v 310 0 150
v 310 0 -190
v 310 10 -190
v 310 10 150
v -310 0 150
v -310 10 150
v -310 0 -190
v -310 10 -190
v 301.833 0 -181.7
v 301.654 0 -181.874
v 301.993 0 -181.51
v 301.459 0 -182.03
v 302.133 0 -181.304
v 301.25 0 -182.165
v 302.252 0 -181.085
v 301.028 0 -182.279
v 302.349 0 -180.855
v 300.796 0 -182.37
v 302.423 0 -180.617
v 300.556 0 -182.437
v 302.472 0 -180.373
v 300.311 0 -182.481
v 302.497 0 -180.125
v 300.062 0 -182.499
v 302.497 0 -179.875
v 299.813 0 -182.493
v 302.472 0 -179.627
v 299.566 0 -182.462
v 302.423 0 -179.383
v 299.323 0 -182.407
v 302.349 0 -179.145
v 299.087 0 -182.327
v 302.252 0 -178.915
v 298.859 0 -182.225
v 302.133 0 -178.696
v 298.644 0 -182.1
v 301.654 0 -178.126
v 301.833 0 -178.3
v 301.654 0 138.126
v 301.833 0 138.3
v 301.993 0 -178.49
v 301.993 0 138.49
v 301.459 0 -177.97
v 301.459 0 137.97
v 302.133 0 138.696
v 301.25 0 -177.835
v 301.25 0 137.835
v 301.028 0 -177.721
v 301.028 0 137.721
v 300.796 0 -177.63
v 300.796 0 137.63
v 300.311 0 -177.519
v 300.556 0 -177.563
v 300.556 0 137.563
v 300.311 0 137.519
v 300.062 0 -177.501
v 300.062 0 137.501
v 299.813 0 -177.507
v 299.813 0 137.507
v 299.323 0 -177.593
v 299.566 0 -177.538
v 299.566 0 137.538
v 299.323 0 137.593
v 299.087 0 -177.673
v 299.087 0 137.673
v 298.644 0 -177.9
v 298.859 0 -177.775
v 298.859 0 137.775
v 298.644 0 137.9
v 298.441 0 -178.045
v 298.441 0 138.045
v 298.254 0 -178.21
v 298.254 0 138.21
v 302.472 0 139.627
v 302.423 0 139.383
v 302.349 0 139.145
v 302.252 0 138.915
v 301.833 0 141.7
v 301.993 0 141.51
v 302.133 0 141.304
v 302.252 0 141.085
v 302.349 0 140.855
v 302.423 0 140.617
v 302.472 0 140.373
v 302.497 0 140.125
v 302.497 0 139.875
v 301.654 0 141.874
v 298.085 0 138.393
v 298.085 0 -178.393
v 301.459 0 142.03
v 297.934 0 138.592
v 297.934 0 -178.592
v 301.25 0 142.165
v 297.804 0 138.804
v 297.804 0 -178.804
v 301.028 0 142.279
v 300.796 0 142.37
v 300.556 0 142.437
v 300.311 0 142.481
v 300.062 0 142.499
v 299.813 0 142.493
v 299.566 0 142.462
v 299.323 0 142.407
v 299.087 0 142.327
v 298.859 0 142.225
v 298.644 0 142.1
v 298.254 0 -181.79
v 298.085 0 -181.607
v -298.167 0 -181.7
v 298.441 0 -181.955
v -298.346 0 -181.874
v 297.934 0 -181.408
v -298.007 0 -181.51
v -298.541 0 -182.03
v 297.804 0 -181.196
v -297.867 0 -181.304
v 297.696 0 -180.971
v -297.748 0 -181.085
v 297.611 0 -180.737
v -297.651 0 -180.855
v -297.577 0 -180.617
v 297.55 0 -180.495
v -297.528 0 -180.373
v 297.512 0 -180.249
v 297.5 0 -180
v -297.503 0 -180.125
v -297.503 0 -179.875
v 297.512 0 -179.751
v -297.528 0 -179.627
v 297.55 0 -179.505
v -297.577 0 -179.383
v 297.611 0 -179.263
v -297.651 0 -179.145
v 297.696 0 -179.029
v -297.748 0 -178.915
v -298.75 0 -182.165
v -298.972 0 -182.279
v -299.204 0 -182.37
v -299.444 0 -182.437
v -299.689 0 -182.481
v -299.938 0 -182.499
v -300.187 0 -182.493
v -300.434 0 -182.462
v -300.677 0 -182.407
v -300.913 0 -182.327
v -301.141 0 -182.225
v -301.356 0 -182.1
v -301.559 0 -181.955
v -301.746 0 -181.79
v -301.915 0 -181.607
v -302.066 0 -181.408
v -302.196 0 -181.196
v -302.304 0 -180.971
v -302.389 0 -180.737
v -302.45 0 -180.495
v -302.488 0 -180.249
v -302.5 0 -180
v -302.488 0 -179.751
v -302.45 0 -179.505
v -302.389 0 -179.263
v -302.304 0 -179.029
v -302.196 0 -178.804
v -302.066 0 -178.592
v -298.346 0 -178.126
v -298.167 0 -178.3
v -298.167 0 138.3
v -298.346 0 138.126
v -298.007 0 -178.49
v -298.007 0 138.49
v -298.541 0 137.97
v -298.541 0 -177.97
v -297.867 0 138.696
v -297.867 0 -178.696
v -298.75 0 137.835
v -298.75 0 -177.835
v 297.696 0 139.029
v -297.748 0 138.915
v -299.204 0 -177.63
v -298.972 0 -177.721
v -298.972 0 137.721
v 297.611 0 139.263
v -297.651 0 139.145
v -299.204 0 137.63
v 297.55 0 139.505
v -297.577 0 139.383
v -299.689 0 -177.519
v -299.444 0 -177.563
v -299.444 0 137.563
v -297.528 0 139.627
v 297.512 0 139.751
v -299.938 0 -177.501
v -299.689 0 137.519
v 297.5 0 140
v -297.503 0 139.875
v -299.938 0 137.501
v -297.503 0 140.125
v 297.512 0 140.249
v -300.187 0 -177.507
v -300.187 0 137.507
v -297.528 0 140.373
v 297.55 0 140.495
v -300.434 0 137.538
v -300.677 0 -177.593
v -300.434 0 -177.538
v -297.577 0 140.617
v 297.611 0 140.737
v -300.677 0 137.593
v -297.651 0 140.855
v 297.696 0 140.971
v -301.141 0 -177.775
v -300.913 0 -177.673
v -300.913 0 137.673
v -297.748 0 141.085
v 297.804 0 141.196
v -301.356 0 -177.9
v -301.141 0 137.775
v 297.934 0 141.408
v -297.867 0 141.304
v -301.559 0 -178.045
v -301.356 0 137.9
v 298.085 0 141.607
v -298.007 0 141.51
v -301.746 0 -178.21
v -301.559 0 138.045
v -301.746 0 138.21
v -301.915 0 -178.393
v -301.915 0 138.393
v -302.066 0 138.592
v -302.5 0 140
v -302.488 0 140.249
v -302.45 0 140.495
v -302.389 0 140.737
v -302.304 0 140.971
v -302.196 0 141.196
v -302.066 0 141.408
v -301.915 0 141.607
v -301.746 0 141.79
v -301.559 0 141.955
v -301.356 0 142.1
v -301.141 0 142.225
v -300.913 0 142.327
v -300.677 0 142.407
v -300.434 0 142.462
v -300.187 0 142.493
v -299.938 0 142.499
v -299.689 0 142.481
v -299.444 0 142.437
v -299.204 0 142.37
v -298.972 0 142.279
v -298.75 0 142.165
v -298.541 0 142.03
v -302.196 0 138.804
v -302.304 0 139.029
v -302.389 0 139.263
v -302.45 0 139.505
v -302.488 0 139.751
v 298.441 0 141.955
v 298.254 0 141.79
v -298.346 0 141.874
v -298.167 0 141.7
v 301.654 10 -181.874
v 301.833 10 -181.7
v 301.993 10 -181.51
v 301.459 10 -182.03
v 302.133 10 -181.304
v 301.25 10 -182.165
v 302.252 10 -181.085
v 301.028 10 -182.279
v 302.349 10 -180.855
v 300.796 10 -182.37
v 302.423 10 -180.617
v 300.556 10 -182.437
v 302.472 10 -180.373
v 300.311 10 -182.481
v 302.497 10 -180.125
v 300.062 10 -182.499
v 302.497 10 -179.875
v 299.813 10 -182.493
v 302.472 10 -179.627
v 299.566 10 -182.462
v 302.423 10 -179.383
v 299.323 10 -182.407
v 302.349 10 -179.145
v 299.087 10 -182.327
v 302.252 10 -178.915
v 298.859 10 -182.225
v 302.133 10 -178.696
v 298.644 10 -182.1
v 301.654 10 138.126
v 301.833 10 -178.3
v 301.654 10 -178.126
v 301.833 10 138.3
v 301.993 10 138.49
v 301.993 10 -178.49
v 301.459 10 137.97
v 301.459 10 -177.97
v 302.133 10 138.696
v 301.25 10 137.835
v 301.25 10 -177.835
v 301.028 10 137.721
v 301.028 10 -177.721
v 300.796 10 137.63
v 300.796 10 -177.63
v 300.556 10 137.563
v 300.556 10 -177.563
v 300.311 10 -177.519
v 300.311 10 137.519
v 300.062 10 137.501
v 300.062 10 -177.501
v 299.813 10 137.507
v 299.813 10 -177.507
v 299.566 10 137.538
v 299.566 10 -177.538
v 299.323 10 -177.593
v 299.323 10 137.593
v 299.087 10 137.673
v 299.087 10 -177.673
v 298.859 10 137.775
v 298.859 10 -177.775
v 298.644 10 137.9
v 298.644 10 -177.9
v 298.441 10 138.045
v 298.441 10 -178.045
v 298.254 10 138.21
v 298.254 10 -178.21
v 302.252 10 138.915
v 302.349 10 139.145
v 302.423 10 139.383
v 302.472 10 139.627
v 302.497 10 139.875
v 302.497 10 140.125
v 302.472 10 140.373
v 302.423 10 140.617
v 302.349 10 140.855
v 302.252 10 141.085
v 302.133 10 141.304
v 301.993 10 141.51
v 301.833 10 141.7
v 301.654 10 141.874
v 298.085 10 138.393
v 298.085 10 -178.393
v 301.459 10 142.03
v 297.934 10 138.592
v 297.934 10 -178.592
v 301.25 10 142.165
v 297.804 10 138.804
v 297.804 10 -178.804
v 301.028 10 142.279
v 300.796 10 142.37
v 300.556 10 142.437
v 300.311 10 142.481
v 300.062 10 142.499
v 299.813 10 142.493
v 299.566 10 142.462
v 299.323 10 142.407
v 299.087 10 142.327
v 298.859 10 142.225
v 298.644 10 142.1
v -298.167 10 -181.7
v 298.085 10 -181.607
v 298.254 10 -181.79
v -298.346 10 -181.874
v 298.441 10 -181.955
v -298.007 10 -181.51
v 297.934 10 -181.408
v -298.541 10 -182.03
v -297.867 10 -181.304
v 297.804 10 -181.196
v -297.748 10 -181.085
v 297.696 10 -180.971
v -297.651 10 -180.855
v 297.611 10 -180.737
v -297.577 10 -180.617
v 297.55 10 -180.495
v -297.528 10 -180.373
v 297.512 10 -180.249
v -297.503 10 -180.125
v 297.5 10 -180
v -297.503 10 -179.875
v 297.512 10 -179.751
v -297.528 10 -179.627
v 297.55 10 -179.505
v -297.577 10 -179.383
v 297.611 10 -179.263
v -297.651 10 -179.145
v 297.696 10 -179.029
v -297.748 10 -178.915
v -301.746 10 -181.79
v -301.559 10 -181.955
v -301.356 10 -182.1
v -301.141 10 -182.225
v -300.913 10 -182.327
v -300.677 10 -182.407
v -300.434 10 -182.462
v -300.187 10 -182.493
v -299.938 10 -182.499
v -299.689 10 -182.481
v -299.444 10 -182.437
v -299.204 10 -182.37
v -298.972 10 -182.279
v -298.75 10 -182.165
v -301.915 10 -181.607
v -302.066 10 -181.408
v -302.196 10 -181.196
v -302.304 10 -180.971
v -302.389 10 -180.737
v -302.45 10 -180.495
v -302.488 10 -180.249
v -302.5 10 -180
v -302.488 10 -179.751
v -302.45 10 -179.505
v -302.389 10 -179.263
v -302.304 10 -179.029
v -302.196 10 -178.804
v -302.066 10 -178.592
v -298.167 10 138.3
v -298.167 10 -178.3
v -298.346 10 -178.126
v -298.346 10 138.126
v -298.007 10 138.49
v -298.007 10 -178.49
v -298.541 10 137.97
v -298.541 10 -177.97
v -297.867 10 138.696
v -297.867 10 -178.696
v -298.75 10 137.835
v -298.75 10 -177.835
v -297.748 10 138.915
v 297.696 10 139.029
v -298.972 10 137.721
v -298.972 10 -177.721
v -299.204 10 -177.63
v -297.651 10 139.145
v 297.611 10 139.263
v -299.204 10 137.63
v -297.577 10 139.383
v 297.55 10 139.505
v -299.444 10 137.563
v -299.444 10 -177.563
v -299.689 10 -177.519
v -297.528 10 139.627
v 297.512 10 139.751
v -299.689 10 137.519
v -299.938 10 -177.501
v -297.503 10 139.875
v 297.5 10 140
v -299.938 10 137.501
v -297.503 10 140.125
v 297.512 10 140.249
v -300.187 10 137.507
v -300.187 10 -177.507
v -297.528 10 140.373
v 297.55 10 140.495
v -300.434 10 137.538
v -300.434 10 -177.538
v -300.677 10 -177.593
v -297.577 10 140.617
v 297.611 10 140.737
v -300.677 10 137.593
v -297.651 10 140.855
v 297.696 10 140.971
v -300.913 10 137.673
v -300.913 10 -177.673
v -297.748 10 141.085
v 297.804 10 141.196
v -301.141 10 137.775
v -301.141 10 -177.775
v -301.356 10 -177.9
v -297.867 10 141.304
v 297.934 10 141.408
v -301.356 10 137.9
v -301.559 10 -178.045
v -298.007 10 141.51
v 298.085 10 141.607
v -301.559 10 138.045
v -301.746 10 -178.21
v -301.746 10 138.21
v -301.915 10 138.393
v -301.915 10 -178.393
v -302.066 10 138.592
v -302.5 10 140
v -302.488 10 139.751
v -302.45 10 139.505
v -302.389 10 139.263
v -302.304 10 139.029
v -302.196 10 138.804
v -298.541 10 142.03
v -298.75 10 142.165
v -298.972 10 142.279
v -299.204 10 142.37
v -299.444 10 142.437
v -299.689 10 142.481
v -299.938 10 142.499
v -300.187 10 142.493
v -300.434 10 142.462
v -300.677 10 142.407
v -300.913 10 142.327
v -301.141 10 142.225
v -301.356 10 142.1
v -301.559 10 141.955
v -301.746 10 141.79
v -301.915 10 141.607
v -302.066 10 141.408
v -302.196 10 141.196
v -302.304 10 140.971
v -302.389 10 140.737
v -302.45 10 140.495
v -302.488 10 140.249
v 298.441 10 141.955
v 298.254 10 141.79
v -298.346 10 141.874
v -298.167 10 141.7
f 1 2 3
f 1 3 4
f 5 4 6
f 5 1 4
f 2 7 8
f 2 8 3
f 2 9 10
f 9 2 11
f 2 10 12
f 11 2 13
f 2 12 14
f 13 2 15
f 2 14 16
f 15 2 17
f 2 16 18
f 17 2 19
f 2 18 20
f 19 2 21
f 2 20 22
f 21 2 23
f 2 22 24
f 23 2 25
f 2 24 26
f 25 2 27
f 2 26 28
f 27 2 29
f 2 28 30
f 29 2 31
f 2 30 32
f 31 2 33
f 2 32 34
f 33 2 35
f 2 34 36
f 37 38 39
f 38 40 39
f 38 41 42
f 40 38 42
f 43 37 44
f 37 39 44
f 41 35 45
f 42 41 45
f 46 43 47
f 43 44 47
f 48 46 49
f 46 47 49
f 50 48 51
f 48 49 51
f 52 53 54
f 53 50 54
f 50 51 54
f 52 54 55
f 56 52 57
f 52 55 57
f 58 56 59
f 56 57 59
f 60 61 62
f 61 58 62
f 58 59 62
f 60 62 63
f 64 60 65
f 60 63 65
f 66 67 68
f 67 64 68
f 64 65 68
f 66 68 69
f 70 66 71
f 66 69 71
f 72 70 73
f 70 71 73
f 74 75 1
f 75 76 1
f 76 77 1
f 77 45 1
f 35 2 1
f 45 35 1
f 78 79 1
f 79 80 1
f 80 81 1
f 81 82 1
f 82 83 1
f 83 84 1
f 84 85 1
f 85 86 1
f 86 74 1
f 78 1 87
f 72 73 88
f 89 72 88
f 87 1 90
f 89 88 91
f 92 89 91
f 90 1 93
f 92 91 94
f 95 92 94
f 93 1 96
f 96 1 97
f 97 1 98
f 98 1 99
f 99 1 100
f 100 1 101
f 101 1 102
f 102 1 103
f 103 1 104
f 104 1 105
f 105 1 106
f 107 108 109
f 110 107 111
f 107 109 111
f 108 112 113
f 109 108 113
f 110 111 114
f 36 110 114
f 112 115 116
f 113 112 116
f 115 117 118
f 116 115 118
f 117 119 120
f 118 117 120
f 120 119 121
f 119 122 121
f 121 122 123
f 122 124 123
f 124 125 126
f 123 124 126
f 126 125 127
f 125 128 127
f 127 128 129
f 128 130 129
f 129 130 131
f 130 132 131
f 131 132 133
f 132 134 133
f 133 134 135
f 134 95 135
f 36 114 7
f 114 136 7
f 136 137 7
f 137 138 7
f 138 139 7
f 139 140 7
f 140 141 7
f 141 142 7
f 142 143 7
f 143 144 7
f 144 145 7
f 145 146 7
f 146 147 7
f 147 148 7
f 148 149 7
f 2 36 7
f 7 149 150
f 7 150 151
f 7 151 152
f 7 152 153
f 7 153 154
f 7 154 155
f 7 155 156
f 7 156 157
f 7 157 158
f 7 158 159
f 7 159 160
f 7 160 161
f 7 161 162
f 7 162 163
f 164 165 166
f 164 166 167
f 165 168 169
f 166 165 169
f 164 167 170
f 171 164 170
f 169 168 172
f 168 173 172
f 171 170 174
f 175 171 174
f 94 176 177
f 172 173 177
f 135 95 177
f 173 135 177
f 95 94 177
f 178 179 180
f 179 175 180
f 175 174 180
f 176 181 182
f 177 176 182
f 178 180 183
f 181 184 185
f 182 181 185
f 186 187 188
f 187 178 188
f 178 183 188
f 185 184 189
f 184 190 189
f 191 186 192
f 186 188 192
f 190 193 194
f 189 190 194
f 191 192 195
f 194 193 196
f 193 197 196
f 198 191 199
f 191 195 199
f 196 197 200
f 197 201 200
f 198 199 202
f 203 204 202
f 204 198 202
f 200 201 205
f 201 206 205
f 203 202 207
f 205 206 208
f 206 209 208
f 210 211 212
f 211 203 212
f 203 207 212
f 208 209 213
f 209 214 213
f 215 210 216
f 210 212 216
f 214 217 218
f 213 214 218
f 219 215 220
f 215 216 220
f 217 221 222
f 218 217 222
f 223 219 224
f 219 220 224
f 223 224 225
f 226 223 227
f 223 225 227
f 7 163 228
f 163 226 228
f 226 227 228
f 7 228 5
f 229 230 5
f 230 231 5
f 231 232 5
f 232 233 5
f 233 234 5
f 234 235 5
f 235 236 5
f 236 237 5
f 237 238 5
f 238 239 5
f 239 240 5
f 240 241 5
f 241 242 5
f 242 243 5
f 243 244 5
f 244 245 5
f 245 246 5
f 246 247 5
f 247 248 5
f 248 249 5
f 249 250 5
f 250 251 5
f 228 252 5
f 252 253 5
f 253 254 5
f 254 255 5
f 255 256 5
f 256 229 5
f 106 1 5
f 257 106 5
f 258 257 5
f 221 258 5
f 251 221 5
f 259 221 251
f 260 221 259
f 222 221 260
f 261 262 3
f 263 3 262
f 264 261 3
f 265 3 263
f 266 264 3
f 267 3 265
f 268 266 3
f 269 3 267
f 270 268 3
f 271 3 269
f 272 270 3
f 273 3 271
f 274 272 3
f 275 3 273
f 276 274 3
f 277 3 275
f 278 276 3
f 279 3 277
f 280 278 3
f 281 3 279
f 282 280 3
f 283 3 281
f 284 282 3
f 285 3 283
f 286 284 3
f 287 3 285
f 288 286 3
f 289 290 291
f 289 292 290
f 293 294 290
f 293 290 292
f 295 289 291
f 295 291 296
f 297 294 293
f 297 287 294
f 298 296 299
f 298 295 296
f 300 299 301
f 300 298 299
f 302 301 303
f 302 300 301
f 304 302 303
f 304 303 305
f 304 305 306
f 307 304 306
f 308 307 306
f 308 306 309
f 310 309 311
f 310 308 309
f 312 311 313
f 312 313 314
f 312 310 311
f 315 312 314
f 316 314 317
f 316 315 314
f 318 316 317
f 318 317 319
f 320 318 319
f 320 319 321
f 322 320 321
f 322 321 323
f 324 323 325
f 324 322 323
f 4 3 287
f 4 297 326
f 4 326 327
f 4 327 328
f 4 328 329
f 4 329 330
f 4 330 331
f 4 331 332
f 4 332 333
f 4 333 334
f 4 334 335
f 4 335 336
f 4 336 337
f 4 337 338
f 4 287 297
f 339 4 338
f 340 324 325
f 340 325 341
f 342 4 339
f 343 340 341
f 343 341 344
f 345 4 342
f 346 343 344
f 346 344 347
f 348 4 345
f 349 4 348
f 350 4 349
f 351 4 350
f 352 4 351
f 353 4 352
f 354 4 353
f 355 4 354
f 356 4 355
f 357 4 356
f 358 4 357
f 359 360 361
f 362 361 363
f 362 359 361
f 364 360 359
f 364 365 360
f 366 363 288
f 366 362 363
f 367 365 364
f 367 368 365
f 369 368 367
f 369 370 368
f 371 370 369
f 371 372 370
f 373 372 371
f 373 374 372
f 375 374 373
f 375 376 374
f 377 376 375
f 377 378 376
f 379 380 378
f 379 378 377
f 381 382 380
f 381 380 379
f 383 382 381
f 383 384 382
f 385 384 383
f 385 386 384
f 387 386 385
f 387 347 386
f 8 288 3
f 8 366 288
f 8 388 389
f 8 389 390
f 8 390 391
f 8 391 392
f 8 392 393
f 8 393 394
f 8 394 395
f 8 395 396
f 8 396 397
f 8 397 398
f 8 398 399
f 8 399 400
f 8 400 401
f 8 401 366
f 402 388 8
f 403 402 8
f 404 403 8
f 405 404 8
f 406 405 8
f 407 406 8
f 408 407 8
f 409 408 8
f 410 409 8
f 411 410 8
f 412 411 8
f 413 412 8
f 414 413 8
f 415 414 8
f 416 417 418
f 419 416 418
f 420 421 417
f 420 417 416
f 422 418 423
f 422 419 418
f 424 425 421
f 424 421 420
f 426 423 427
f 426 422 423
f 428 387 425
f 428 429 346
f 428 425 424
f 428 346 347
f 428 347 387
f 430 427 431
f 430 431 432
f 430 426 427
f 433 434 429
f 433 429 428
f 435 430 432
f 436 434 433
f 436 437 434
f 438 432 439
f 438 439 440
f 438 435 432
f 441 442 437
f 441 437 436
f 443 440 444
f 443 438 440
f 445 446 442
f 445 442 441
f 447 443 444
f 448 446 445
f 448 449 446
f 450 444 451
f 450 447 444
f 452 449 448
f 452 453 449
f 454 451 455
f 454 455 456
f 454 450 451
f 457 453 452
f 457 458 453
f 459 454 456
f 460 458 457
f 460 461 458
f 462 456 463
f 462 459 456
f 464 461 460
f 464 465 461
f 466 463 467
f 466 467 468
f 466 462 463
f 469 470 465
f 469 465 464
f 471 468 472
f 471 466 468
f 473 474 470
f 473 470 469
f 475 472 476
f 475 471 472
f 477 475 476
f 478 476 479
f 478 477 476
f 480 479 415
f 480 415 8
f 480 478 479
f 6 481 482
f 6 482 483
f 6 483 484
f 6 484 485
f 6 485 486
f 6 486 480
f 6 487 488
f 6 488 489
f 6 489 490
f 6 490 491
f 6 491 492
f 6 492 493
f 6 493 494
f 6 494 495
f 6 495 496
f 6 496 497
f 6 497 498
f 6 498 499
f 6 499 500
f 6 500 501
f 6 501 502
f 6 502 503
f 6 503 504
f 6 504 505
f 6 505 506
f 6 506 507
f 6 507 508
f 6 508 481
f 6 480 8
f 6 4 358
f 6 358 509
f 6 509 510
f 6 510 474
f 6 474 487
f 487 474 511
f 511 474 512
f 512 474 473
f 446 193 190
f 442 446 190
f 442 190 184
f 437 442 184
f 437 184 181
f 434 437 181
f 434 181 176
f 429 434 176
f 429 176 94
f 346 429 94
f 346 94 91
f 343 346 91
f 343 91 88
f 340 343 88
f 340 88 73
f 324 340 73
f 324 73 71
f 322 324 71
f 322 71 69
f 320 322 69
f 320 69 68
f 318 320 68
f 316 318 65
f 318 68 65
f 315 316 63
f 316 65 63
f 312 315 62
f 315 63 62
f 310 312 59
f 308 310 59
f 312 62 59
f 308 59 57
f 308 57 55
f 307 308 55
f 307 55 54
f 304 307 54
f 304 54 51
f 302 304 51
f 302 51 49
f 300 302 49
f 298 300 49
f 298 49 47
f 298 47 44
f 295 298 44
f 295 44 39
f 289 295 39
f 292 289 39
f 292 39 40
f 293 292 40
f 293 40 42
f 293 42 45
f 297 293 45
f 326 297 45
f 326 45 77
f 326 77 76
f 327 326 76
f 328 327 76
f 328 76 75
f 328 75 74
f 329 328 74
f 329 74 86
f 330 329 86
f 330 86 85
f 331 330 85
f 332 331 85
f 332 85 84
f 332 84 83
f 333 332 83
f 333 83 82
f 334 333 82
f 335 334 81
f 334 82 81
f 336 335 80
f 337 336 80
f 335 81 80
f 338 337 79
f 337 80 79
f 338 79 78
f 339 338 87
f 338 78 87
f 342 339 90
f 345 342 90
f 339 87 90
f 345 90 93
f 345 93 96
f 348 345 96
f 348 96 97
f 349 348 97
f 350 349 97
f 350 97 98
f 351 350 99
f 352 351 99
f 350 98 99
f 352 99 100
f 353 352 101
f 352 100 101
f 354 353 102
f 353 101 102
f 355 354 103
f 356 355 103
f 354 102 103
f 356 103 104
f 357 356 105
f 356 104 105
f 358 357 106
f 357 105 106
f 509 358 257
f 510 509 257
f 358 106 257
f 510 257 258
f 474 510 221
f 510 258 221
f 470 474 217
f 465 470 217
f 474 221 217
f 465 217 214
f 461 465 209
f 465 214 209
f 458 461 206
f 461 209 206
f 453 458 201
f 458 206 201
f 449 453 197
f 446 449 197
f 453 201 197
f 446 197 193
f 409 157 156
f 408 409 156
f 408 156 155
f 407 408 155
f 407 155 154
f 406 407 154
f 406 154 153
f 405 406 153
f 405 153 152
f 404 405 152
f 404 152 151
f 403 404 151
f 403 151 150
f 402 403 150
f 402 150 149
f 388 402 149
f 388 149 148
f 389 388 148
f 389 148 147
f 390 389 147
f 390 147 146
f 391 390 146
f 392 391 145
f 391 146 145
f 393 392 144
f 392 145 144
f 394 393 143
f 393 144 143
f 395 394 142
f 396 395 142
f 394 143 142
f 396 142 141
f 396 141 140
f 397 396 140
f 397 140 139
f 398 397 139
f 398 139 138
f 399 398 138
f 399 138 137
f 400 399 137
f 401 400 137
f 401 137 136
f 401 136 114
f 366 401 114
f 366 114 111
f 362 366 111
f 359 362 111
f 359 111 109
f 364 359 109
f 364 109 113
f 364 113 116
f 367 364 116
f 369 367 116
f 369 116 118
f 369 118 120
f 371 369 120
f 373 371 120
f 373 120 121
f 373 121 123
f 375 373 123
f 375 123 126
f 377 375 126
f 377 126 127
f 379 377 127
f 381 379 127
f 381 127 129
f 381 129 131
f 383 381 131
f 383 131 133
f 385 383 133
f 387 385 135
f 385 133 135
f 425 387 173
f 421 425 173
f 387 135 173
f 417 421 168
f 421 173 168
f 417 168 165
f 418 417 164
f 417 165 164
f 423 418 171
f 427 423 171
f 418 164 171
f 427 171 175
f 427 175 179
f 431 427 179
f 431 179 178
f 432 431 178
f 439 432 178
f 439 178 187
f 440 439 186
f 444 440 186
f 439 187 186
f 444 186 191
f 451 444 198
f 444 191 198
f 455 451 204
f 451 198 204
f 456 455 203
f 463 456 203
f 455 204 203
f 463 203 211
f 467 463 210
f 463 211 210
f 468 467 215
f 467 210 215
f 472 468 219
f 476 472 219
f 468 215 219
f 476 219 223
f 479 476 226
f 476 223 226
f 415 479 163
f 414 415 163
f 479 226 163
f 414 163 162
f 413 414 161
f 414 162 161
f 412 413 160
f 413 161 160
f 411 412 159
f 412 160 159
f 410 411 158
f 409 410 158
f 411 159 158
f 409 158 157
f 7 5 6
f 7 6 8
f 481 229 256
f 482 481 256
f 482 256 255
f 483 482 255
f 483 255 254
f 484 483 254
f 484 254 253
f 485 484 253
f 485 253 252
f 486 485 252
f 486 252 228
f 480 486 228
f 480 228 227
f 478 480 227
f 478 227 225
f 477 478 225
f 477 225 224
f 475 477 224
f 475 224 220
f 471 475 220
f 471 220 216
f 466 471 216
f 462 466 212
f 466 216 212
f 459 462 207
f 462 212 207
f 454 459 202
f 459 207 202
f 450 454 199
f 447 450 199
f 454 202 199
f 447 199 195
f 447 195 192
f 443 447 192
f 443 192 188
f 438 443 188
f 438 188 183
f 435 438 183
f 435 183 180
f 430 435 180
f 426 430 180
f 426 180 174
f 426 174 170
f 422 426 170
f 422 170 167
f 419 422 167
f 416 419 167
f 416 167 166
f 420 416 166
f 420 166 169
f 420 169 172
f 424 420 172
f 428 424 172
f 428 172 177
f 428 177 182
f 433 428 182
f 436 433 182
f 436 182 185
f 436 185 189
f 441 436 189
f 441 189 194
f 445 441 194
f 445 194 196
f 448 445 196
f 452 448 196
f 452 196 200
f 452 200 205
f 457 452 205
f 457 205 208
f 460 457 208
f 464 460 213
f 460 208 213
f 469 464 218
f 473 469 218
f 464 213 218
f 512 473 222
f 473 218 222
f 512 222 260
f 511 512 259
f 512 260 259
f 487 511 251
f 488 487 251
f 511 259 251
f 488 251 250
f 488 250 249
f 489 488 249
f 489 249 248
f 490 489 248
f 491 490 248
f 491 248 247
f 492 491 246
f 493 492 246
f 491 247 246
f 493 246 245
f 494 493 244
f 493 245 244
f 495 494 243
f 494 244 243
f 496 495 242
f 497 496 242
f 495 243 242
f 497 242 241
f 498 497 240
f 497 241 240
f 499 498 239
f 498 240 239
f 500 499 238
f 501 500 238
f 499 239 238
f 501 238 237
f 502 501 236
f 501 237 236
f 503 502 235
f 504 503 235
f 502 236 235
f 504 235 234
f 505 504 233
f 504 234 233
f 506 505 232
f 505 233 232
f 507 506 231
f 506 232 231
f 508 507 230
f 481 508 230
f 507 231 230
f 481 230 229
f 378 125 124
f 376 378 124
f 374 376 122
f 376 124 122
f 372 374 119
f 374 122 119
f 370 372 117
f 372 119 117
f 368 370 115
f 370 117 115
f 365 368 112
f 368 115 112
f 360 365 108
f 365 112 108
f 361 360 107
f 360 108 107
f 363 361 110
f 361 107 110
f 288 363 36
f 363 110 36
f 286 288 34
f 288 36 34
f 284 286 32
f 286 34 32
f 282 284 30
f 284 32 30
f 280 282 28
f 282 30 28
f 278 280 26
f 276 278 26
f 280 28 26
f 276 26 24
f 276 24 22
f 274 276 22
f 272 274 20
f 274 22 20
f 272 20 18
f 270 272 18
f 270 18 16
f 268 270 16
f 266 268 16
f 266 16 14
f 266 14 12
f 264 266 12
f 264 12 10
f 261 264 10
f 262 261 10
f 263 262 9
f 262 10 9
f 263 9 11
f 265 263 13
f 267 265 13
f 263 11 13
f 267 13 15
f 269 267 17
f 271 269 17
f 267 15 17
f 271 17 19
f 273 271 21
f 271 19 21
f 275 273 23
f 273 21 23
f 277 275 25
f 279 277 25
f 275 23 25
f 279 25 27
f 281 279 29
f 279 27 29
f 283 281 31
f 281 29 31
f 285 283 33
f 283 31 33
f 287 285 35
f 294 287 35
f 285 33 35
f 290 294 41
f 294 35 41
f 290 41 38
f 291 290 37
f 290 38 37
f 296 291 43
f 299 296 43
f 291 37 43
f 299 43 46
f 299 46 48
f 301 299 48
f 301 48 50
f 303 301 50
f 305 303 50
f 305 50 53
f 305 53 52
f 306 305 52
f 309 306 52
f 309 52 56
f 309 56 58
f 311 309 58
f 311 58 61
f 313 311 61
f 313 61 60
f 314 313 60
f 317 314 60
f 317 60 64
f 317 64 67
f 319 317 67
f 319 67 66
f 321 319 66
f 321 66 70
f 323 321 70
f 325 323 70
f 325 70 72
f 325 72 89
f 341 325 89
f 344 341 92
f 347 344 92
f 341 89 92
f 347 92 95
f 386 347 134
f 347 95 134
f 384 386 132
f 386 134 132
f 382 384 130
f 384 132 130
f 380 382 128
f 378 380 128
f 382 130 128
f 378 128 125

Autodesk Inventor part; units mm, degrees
ref_plane "YZ Plane" through (0, 0, 0) normal (1, 0, 0) x (0, 1, 0)
ref_plane "XZ Plane" through (0, 0, 0) normal (0, 1, 0) x (-1, 0, 0)
ref_plane "XY Plane" through (0, 0, 0) normal (0, 0, 1) x (1, 0, 0)
sketch "Sketch1" plane through (0, 0, 0) normal (0, 1, 0) x (-1, 0, 0)
  line L0 (-310, 150) -> (310, 150)
  line L1 (310, 150) -> (310, -190)
  line L2 (310, -190) -> (-310, -190)
  line L3 (-310, -190) -> (-310, 150)
  line L4 (-300, -180) -> (300, -180)
  line L5 (300, -180) -> (300, 140)
  line L6 (300, 140) -> (-300, 140)
  line L7 (-300, 140) -> (-300, -180)
  circle A0 centre (300, -180) radius 2.5
  circle A1 centre (-300, -180) radius 2.5
  circle A2 centre (-300, 140) radius 2.5
  circle A3 centre (300, 140) radius 2.5
  point P0 (0, 0)
  dimension "d0" = 620
  dimension "d1" = 340
  dimension "d2" = 10
  dimension "d3" = 5
  dimension "d4" = 5
  dimension "d5" = 5
  dimension "d6" = 5
extrude "Extrusion1" add sketch "Sketch1" along normal blind 10 contours L0 L1 L2 L3 | A1 L7 A2 L6 A3 L5 A0 L4
properties part number "CaraSuperior"
